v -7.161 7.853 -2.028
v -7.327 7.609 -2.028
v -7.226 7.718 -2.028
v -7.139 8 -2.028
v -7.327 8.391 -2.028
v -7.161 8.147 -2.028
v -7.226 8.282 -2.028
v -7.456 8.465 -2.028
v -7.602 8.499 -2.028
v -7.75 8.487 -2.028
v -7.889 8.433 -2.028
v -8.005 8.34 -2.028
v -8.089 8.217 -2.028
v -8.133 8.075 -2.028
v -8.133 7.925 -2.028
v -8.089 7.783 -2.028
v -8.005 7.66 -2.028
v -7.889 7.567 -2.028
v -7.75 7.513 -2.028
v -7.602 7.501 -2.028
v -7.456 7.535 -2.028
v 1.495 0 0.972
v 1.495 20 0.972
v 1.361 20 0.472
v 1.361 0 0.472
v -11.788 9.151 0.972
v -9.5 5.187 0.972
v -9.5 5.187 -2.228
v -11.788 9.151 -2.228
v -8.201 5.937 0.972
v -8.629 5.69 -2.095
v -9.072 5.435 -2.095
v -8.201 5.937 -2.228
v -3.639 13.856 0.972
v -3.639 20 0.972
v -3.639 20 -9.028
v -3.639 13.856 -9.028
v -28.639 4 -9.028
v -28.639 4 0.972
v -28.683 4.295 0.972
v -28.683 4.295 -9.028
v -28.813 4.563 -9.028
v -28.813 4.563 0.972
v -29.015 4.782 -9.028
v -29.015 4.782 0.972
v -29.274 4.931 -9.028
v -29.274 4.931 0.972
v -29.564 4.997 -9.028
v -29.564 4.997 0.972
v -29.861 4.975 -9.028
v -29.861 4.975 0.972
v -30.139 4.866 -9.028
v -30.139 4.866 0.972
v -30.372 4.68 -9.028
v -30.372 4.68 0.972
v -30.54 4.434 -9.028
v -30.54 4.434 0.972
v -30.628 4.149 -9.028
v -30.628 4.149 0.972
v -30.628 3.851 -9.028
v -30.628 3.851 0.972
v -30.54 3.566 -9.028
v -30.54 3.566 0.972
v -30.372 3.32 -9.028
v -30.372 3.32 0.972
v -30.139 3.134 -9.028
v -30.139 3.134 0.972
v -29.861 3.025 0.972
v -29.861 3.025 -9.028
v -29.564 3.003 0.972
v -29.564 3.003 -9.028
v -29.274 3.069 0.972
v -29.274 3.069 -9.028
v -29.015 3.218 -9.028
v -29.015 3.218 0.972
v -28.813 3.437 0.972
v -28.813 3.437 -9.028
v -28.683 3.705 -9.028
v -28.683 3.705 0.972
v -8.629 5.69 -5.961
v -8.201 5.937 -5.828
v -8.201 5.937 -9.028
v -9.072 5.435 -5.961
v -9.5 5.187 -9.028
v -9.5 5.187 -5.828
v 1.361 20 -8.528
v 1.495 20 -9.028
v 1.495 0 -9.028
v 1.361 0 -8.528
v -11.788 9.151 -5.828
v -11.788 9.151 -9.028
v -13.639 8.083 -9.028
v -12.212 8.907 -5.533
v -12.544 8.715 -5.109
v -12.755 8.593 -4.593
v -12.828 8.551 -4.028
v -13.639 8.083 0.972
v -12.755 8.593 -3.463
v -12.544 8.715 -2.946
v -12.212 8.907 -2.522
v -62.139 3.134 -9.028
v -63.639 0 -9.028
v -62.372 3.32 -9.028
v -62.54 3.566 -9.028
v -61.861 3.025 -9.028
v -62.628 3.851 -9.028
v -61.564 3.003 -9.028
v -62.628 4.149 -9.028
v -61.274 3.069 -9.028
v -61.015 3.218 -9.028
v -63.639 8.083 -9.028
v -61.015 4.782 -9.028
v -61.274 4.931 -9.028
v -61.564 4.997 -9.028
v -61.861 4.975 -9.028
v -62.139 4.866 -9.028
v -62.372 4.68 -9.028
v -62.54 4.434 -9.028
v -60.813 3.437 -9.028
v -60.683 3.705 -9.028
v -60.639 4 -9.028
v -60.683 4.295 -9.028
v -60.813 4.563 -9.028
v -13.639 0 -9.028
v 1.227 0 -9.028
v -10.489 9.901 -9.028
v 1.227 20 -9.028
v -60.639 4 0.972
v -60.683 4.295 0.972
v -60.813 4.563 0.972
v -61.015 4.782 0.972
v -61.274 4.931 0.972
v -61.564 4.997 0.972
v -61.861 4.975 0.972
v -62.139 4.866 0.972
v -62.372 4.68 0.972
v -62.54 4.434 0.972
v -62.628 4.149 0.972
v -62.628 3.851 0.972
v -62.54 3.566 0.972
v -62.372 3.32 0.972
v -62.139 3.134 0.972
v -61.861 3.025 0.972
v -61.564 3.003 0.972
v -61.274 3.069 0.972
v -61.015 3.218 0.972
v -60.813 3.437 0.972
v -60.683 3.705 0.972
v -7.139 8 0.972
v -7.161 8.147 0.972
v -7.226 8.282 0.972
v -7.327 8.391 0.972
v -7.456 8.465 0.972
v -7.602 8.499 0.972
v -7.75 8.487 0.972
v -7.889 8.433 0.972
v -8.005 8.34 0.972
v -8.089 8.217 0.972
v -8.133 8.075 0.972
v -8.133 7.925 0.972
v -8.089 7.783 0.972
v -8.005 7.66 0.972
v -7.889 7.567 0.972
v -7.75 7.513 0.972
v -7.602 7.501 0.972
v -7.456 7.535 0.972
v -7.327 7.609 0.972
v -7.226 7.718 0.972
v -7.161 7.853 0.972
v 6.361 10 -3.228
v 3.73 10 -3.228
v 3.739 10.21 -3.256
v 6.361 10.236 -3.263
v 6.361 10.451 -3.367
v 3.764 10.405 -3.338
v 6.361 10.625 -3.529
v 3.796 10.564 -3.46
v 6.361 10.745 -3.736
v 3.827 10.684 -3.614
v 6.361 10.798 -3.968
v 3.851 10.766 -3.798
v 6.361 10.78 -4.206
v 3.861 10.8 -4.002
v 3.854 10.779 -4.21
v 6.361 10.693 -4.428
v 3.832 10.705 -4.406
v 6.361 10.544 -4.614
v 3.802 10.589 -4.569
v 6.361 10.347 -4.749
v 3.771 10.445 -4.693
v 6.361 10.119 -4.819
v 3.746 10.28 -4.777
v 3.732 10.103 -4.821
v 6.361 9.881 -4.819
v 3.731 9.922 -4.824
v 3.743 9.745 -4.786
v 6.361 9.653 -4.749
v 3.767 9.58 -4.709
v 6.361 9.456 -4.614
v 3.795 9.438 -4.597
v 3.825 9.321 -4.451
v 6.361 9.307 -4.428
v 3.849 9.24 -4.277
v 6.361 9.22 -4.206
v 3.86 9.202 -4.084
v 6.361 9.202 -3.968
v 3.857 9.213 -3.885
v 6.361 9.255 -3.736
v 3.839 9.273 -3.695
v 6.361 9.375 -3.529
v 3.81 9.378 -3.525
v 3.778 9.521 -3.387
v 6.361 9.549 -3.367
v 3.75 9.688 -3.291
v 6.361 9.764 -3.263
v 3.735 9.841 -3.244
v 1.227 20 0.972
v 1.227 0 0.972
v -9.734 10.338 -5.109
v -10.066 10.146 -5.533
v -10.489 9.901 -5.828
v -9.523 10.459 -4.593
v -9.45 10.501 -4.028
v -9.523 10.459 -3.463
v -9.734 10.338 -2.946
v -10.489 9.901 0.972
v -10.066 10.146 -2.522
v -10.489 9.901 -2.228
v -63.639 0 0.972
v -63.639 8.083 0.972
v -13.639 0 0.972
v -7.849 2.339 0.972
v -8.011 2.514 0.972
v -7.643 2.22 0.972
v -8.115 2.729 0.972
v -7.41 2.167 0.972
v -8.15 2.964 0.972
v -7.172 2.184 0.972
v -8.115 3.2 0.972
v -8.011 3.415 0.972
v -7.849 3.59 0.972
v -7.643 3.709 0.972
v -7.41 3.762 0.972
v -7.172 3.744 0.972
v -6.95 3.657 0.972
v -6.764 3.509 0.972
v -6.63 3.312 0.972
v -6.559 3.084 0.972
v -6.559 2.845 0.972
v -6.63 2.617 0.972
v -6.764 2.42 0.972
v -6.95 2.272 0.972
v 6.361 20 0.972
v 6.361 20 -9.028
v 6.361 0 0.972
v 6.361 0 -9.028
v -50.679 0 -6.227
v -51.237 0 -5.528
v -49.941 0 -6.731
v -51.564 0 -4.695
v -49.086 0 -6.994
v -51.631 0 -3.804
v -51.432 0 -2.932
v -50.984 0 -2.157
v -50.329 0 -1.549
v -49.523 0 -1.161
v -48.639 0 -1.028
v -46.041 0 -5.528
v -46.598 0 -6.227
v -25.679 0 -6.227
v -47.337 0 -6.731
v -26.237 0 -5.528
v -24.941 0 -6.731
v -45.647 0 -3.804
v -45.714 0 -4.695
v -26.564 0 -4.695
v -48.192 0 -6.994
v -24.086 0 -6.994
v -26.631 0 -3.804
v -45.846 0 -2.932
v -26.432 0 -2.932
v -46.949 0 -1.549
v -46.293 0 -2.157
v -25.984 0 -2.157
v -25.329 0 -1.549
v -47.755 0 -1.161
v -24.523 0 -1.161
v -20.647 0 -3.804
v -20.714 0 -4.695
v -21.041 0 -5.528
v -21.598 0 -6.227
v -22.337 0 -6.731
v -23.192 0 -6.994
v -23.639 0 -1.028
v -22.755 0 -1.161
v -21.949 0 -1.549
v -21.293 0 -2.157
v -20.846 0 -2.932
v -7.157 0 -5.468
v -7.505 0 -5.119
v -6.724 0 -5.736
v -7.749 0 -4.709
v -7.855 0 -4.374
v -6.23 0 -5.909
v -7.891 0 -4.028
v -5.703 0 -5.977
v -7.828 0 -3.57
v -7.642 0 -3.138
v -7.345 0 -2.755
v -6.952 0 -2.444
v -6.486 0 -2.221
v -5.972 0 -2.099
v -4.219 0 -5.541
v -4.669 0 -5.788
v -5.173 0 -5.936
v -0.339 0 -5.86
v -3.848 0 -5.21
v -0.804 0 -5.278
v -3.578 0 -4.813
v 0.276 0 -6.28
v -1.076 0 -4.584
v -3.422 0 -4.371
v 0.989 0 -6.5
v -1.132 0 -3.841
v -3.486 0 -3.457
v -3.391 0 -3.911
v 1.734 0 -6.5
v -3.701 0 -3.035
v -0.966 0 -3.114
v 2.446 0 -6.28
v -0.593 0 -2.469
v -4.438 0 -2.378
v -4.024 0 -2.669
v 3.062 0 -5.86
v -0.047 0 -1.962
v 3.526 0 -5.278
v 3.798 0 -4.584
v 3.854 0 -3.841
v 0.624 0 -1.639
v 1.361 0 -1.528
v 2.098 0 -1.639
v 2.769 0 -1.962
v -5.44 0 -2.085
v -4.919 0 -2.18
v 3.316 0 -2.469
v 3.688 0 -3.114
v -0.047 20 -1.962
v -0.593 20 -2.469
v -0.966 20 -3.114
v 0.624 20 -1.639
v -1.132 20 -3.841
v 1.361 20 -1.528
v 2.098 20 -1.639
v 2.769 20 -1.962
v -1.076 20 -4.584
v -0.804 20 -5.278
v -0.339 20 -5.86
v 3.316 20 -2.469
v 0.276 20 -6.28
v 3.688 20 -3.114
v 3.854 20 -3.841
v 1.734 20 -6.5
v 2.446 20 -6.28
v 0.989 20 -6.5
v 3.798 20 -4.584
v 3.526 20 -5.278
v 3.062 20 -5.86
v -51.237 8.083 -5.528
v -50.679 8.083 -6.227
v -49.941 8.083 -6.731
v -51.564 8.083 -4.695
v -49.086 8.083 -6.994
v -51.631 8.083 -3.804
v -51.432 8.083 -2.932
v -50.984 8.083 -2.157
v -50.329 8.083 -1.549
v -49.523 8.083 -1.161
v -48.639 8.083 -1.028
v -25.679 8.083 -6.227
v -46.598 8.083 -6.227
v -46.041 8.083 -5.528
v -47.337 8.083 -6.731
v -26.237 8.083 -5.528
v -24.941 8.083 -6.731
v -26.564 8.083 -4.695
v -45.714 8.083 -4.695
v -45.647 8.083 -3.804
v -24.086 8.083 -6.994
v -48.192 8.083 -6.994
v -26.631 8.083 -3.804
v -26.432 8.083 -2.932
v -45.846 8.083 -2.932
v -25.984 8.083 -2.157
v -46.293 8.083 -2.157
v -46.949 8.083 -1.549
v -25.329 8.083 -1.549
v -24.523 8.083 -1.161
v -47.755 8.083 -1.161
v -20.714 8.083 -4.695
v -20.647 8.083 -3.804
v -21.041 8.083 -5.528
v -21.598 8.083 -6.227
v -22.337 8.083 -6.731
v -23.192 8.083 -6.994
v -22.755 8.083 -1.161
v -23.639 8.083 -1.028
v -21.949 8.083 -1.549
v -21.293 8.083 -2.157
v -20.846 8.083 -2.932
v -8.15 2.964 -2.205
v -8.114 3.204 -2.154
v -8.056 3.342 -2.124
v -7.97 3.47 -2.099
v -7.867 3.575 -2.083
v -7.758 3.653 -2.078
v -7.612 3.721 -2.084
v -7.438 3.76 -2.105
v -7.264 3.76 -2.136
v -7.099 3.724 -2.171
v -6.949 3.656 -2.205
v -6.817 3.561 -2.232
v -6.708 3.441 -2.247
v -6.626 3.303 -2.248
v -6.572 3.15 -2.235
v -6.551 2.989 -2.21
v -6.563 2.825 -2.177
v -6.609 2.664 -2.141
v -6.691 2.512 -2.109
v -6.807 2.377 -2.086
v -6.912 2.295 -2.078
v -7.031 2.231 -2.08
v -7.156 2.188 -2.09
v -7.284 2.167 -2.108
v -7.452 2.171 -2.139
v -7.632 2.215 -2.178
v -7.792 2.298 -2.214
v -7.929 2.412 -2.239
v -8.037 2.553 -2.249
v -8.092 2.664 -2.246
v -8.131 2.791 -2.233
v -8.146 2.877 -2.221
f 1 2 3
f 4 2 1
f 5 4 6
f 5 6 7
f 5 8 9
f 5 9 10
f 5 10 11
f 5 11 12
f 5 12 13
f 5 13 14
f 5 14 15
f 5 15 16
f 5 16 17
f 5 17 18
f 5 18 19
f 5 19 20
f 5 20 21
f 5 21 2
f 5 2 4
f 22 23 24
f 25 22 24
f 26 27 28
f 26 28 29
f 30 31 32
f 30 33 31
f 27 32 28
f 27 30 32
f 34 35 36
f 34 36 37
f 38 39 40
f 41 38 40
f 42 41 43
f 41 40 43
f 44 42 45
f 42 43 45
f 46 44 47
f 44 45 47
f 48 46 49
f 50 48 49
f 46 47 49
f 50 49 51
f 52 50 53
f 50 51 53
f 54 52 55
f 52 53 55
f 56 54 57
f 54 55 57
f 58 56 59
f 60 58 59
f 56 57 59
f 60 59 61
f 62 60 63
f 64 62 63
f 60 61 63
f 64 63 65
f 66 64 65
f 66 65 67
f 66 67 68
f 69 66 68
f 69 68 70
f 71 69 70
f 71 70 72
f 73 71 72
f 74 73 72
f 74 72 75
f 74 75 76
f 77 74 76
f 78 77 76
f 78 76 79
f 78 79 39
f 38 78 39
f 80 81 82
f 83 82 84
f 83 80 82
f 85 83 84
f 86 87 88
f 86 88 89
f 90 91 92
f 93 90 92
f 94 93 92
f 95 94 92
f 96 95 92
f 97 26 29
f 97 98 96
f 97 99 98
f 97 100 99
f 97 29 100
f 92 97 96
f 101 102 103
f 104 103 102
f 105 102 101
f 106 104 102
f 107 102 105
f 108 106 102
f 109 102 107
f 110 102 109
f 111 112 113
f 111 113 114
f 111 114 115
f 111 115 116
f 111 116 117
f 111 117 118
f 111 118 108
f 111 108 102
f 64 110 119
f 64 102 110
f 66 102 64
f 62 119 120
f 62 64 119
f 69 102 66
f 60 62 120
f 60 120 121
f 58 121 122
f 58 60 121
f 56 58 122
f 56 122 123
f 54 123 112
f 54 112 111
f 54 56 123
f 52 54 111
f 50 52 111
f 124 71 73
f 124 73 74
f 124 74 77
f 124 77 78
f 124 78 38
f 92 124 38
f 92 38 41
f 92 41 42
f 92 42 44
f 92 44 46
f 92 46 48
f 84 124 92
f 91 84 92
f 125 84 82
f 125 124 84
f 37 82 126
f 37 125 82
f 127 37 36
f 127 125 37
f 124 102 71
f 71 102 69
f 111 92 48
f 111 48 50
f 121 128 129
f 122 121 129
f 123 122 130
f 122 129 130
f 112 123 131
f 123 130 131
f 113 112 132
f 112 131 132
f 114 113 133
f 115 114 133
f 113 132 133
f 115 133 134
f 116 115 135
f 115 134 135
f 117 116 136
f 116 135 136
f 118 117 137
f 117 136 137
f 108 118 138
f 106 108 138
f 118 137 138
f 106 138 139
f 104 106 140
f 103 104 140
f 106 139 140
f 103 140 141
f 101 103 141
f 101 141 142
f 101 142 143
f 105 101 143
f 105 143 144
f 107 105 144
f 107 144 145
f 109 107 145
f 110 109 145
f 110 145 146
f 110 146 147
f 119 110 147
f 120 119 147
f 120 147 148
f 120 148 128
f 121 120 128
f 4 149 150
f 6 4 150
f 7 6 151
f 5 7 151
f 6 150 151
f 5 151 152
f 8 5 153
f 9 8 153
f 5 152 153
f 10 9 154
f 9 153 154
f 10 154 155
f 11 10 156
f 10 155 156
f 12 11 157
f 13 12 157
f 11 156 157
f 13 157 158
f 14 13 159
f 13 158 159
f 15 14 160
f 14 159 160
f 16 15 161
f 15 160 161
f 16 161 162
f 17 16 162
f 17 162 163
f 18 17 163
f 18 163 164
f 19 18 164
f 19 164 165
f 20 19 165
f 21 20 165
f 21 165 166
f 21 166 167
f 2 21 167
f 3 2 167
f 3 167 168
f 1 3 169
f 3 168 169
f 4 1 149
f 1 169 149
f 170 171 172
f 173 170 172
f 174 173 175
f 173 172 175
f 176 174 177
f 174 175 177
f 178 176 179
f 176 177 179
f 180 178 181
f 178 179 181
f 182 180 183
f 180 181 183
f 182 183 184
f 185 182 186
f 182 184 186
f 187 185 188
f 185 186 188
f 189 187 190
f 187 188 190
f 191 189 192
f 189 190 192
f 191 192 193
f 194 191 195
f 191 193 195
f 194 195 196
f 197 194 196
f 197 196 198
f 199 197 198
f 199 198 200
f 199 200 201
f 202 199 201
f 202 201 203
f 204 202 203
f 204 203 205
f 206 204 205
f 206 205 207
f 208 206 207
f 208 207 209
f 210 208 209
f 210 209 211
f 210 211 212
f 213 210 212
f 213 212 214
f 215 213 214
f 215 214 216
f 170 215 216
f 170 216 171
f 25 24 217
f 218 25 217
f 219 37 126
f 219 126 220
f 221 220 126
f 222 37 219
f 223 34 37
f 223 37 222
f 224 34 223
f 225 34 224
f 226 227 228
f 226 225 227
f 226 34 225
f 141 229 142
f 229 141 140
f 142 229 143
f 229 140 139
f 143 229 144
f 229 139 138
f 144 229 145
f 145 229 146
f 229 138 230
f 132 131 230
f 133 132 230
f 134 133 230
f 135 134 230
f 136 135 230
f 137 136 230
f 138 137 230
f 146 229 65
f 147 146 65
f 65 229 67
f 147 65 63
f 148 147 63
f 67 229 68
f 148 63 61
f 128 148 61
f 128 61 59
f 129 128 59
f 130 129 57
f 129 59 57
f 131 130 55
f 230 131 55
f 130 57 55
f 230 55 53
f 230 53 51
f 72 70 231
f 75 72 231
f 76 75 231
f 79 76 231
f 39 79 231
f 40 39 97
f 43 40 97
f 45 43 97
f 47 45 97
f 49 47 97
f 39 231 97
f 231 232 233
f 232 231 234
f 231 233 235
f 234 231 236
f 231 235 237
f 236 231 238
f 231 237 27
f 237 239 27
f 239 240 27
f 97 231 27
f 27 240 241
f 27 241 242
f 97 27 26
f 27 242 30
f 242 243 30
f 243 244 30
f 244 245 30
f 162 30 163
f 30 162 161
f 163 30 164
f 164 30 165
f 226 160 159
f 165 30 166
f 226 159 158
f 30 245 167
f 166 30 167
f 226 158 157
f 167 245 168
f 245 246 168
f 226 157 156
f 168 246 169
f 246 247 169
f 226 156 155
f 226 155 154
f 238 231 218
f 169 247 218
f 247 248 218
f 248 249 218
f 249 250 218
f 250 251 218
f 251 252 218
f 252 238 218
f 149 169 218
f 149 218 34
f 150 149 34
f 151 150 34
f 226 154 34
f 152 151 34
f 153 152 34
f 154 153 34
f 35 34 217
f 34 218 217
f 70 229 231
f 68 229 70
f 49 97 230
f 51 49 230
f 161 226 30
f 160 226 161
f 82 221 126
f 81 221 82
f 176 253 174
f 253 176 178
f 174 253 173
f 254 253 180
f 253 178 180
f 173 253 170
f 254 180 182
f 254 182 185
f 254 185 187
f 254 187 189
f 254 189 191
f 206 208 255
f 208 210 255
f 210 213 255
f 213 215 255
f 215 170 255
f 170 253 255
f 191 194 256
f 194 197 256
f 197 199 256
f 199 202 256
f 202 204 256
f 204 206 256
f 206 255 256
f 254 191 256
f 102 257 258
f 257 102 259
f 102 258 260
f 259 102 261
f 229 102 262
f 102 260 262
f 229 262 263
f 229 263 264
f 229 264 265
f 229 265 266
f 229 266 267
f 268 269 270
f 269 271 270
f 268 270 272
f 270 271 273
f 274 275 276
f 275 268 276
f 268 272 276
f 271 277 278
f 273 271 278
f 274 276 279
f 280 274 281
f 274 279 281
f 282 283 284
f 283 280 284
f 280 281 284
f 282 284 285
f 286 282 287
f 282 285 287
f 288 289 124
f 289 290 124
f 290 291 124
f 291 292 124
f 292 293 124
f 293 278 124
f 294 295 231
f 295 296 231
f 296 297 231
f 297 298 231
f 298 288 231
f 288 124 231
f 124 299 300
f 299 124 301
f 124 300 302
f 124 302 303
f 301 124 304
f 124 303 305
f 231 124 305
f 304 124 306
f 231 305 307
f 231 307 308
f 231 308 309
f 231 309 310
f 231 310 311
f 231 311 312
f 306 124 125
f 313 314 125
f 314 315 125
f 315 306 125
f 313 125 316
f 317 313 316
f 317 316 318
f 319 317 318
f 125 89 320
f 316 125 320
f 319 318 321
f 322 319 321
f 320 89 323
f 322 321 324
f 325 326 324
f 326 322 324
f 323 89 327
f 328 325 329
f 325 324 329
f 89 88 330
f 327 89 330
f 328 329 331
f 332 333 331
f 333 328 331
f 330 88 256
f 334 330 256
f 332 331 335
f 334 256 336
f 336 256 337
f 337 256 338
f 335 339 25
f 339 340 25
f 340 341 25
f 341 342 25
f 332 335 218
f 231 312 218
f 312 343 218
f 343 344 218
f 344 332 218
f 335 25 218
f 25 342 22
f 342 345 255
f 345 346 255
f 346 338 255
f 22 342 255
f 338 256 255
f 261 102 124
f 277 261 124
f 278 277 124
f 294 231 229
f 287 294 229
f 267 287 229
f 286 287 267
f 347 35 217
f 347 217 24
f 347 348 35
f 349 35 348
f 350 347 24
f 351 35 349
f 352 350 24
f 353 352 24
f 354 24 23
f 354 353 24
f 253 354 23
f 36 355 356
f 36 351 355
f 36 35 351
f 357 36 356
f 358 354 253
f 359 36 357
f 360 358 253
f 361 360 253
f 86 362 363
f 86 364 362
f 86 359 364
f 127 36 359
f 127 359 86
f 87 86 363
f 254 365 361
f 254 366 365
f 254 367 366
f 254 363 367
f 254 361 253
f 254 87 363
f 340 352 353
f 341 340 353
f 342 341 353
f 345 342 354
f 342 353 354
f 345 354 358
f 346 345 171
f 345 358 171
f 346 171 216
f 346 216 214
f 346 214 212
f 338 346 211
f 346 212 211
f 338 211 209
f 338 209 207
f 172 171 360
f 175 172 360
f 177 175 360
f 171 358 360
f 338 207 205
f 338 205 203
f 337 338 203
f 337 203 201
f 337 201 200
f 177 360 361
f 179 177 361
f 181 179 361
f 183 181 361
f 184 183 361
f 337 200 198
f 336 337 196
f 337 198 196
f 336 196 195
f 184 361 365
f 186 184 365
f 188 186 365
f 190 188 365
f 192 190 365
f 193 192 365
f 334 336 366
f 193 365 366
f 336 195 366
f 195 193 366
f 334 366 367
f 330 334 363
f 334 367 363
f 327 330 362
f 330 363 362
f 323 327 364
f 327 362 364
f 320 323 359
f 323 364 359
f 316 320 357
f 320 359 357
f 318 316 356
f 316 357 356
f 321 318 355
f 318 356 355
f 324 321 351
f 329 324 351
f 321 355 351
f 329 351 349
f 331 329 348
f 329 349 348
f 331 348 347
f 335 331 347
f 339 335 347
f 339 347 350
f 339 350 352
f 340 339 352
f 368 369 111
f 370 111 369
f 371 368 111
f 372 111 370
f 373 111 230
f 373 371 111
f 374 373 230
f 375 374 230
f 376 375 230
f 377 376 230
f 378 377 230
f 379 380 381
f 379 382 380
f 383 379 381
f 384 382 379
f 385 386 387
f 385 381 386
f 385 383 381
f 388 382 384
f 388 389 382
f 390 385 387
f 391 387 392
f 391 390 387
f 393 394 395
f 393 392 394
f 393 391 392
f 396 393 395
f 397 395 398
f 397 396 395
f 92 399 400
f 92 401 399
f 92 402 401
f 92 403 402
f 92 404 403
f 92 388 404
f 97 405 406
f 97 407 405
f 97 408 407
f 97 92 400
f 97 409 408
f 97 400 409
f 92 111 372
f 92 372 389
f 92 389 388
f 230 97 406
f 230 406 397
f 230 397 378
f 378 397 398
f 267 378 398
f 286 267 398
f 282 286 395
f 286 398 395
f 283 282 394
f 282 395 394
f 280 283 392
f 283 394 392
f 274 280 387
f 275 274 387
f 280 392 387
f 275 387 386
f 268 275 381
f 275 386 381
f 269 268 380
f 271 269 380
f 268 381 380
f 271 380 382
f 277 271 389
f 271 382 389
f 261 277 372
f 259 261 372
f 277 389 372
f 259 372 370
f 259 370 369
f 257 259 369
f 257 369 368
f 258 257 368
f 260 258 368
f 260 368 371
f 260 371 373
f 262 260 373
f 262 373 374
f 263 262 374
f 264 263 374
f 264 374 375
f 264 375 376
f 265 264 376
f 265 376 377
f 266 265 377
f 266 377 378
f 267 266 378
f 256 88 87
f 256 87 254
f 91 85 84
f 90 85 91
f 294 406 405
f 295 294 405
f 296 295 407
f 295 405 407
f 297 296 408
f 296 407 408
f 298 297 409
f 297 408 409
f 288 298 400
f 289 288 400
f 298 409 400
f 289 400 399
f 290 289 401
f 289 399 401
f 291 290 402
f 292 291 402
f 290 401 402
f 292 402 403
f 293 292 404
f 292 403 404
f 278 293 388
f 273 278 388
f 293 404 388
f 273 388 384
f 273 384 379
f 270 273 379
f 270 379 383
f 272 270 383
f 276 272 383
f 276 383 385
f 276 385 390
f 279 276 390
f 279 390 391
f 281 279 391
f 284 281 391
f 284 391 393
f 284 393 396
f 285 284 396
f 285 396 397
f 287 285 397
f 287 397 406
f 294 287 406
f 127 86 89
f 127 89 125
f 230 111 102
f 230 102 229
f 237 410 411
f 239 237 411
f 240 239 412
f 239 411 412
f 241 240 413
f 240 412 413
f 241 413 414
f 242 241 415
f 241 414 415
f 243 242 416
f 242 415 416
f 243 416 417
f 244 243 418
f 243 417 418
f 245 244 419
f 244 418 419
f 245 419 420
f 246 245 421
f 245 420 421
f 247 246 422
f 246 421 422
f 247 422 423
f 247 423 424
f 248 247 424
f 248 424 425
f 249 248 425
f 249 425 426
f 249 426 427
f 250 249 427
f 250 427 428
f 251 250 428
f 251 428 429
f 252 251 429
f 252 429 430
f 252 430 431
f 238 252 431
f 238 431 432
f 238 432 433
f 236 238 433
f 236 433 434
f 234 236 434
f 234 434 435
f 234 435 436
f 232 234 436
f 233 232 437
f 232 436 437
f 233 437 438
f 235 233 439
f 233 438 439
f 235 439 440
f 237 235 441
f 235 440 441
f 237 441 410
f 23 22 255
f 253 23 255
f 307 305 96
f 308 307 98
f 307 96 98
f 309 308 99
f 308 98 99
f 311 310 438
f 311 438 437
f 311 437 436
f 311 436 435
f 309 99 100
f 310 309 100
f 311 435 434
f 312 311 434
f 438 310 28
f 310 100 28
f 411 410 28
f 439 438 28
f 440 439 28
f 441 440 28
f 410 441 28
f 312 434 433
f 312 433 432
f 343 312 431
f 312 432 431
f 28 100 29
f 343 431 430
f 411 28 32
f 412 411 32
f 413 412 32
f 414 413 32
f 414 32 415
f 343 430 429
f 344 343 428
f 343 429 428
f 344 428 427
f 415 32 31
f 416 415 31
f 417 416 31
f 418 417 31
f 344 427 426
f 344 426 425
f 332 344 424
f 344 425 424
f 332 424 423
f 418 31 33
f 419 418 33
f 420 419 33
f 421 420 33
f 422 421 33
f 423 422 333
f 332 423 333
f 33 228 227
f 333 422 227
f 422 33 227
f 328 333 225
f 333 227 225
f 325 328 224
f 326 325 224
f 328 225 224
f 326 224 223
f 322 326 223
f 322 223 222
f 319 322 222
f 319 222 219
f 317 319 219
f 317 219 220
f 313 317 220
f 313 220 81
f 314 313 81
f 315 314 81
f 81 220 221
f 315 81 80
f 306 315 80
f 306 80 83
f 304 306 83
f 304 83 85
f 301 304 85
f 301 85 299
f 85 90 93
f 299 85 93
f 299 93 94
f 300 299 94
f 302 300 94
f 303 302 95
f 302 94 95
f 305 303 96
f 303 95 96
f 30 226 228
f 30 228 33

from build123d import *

# Parameters (mm, degrees)
SKETCH1_W                 = 20
SKETCH1_H                 = 10
BOSS_EXTRUDE1_DEPTH       = 20
SKETCH2_R                 = 2.5
CUT_EXTRUDE1_DEPTH        = 26.836409614
CUT_EXTRUDE2_DEPTH        = 27.191969955
SKETCH5_R                 = 1.95
CUT_EXTRUDE5_DEPTH        = 21.021203074
M2X0_4_TAPPED_HOLE1_D     = 1.6
M2X0_4_TAPPED_HOLE1_DEPTH = 6
M2X0_4_TAPPED_HOLE1_TIP   = 0.480688495
M2X0_4_TAPPED_HOLE2_D     = 1.6
M2X0_4_TAPPED_HOLE2_DEPTH = 6
M2X0_4_TAPPED_HOLE2_TIP   = 0.480688495
SKETCH14_W                = 10
SKETCH14_H                = 8.082903769
BOSS_EXTRUDE3_DEPTH       = 50
CUT_EXTRUDE7_REACH        = 67.371
SKETCH15_R                = 3
SKETCH16_R                = 1
CUT_EXTRUDE8_DEPTH        = 68.45300722
SKETCH18_R                = 0.5
CUT_EXTRUDE9_DEPTH        = 3


with BuildPart() as part:
    # Sketch1 → Boss-Extrude1 (new body)
    with BuildSketch(Plane(origin=(0, 0, 0), x_dir=(1, 0, 0), z_dir=(0, 1, 0))):
        with Locations((-3.638888889, 4.027777778)):
            Rectangle(SKETCH1_W, SKETCH1_H)
    extrude(amount=BOSS_EXTRUDE1_DEPTH)

    # Sketch2 → Cut-Extrude1 (cut, through all)
    with BuildSketch(Plane(origin=(0, 20, 0), x_dir=(1, 0, 0), z_dir=(0, 1, 0))):
        with Locations((1.361111111, 4.027777778)):
            Circle(SKETCH2_R)
        Polygon((1.495085707, -0.972222222), (1.361111111, -0.472222222), (1.227136515, -0.972222222), align=None)
        Polygon((1.361111111, 8.527777778), (1.227136515, 9.027777778), (1.495085707, 9.027777778), align=None)
    extrude(amount=-CUT_EXTRUDE1_DEPTH, mode=Mode.SUBTRACT)

    # Sketch3 → Cut-Extrude2 (cut, through all)
    with BuildSketch(Plane.XY.offset(0.972222222)):
        Polygon((-13.638888889, 20), (-3.638888889, 20), (-3.638888889, 13.856406461), (-10.489369836, 9.901279442), (-8.200869836, 5.937481169), (-9.499907942, 5.187481169), (-11.788407942, 9.151279442), (-13.638888889, 8.082903769), align=None)
    extrude(amount=-CUT_EXTRUDE2_DEPTH, mode=Mode.SUBTRACT)

    # Sketch5 → Cut-Extrude5 (cut, through all)
    with BuildSketch(Plane(origin=(-6.909722222, 11.967989955, 0), x_dir=(0.8660254037844415, 0.49999999999999534, 0), z_dir=(-0.49999999999999534, 0.8660254037844415, 0))):
        with Locations((-4.883421027, 4.027777778)):
            Circle(SKETCH5_R)
    extrude(amount=-CUT_EXTRUDE5_DEPTH, mode=Mode.SUBTRACT)

    # M2x0.4 Tapped Hole1
    with Locations(Plane(origin=(6.361111111, 0, 0), x_dir=(0, 0, -1), z_dir=(1, 0, 0))):
        with Locations((4.027777778, 10)):
            Hole(M2X0_4_TAPPED_HOLE1_D / 2, depth=M2X0_4_TAPPED_HOLE1_DEPTH)
            with Locations((0, 0, -(M2X0_4_TAPPED_HOLE1_DEPTH + M2X0_4_TAPPED_HOLE1_TIP / 2))):  # 118° drill point
                Cone(0, M2X0_4_TAPPED_HOLE1_D / 2, M2X0_4_TAPPED_HOLE1_TIP, mode=Mode.SUBTRACT)

    # M2x0.4 Tapped Hole2
    with Locations(Plane.XY.offset(0.972222222)):
        with Locations((-7.350388889, 2.964404957)):
            Hole(M2X0_4_TAPPED_HOLE2_D / 2, depth=M2X0_4_TAPPED_HOLE2_DEPTH)
            with Locations((0, 0, -(M2X0_4_TAPPED_HOLE2_DEPTH + M2X0_4_TAPPED_HOLE2_TIP / 2))):  # 118° drill point
                Cone(0, M2X0_4_TAPPED_HOLE2_D / 2, M2X0_4_TAPPED_HOLE2_TIP, mode=Mode.SUBTRACT)

    # Sketch14 → Boss-Extrude3 (add)
    with BuildSketch(Plane.ZY.offset(13.638888889)):
        with Locations((-4.027777778, 4.041451884)):
            Rectangle(SKETCH14_W, SKETCH14_H)
    extrude(amount=BOSS_EXTRUDE3_DEPTH)

    # Sketch15 → Cut-Extrude7 (cut, up to next)
    with BuildSketch(Plane(origin=(0, 8.082903769, 0), x_dir=(1, 0, 0), z_dir=(0, 1, 0)), mode=Mode.PRIVATE) as cut_extrude7_sk1:
        with Locations((-48.638888889, 4.027777778)):
            Circle(SKETCH15_R)
    cut_extrude7_tool1 = extrude(cut_extrude7_sk1.sketch, amount=-CUT_EXTRUDE7_REACH, mode=Mode.PRIVATE) & part.part
    # Sketch15 → Cut-Extrude7 (cut, up to next)
    with BuildSketch(Plane(origin=(0, 8.082903769, 0), x_dir=(1, 0, 0), z_dir=(0, 1, 0)), mode=Mode.PRIVATE) as cut_extrude7_sk2:
        with Locations((-23.638888889, 4.027777778)):
            Circle(SKETCH15_R)
    cut_extrude7_tool2 = extrude(cut_extrude7_sk2.sketch, amount=-CUT_EXTRUDE7_REACH, mode=Mode.PRIVATE) & part.part
    add(cut_extrude7_tool1.solids().sort_by_distance((-48.638889, 8.082904, -4.027778))[0], mode=Mode.SUBTRACT)
    add(cut_extrude7_tool2.solids().sort_by_distance((-23.638889, 8.082904, -4.027778))[0], mode=Mode.SUBTRACT)

    # Sketch16 → Cut-Extrude8 (cut, through all)
    with BuildSketch(Plane.XY.offset(0.972222222)):
        with Locations((-61.638888889, 4)):
            Circle(SKETCH16_R)
        with Locations((-29.638888889, 4)):
            Circle(SKETCH16_R)
    extrude(amount=-CUT_EXTRUDE8_DEPTH, mode=Mode.SUBTRACT)

    # Sketch18 → Cut-Extrude9 (cut)
    with BuildSketch(Plane.XY.offset(0.972222222)):
        with Locations((-7.638888889, 8)):
            Circle(SKETCH18_R)
    extrude(amount=-CUT_EXTRUDE9_DEPTH, mode=Mode.SUBTRACT)


solid = part.part
